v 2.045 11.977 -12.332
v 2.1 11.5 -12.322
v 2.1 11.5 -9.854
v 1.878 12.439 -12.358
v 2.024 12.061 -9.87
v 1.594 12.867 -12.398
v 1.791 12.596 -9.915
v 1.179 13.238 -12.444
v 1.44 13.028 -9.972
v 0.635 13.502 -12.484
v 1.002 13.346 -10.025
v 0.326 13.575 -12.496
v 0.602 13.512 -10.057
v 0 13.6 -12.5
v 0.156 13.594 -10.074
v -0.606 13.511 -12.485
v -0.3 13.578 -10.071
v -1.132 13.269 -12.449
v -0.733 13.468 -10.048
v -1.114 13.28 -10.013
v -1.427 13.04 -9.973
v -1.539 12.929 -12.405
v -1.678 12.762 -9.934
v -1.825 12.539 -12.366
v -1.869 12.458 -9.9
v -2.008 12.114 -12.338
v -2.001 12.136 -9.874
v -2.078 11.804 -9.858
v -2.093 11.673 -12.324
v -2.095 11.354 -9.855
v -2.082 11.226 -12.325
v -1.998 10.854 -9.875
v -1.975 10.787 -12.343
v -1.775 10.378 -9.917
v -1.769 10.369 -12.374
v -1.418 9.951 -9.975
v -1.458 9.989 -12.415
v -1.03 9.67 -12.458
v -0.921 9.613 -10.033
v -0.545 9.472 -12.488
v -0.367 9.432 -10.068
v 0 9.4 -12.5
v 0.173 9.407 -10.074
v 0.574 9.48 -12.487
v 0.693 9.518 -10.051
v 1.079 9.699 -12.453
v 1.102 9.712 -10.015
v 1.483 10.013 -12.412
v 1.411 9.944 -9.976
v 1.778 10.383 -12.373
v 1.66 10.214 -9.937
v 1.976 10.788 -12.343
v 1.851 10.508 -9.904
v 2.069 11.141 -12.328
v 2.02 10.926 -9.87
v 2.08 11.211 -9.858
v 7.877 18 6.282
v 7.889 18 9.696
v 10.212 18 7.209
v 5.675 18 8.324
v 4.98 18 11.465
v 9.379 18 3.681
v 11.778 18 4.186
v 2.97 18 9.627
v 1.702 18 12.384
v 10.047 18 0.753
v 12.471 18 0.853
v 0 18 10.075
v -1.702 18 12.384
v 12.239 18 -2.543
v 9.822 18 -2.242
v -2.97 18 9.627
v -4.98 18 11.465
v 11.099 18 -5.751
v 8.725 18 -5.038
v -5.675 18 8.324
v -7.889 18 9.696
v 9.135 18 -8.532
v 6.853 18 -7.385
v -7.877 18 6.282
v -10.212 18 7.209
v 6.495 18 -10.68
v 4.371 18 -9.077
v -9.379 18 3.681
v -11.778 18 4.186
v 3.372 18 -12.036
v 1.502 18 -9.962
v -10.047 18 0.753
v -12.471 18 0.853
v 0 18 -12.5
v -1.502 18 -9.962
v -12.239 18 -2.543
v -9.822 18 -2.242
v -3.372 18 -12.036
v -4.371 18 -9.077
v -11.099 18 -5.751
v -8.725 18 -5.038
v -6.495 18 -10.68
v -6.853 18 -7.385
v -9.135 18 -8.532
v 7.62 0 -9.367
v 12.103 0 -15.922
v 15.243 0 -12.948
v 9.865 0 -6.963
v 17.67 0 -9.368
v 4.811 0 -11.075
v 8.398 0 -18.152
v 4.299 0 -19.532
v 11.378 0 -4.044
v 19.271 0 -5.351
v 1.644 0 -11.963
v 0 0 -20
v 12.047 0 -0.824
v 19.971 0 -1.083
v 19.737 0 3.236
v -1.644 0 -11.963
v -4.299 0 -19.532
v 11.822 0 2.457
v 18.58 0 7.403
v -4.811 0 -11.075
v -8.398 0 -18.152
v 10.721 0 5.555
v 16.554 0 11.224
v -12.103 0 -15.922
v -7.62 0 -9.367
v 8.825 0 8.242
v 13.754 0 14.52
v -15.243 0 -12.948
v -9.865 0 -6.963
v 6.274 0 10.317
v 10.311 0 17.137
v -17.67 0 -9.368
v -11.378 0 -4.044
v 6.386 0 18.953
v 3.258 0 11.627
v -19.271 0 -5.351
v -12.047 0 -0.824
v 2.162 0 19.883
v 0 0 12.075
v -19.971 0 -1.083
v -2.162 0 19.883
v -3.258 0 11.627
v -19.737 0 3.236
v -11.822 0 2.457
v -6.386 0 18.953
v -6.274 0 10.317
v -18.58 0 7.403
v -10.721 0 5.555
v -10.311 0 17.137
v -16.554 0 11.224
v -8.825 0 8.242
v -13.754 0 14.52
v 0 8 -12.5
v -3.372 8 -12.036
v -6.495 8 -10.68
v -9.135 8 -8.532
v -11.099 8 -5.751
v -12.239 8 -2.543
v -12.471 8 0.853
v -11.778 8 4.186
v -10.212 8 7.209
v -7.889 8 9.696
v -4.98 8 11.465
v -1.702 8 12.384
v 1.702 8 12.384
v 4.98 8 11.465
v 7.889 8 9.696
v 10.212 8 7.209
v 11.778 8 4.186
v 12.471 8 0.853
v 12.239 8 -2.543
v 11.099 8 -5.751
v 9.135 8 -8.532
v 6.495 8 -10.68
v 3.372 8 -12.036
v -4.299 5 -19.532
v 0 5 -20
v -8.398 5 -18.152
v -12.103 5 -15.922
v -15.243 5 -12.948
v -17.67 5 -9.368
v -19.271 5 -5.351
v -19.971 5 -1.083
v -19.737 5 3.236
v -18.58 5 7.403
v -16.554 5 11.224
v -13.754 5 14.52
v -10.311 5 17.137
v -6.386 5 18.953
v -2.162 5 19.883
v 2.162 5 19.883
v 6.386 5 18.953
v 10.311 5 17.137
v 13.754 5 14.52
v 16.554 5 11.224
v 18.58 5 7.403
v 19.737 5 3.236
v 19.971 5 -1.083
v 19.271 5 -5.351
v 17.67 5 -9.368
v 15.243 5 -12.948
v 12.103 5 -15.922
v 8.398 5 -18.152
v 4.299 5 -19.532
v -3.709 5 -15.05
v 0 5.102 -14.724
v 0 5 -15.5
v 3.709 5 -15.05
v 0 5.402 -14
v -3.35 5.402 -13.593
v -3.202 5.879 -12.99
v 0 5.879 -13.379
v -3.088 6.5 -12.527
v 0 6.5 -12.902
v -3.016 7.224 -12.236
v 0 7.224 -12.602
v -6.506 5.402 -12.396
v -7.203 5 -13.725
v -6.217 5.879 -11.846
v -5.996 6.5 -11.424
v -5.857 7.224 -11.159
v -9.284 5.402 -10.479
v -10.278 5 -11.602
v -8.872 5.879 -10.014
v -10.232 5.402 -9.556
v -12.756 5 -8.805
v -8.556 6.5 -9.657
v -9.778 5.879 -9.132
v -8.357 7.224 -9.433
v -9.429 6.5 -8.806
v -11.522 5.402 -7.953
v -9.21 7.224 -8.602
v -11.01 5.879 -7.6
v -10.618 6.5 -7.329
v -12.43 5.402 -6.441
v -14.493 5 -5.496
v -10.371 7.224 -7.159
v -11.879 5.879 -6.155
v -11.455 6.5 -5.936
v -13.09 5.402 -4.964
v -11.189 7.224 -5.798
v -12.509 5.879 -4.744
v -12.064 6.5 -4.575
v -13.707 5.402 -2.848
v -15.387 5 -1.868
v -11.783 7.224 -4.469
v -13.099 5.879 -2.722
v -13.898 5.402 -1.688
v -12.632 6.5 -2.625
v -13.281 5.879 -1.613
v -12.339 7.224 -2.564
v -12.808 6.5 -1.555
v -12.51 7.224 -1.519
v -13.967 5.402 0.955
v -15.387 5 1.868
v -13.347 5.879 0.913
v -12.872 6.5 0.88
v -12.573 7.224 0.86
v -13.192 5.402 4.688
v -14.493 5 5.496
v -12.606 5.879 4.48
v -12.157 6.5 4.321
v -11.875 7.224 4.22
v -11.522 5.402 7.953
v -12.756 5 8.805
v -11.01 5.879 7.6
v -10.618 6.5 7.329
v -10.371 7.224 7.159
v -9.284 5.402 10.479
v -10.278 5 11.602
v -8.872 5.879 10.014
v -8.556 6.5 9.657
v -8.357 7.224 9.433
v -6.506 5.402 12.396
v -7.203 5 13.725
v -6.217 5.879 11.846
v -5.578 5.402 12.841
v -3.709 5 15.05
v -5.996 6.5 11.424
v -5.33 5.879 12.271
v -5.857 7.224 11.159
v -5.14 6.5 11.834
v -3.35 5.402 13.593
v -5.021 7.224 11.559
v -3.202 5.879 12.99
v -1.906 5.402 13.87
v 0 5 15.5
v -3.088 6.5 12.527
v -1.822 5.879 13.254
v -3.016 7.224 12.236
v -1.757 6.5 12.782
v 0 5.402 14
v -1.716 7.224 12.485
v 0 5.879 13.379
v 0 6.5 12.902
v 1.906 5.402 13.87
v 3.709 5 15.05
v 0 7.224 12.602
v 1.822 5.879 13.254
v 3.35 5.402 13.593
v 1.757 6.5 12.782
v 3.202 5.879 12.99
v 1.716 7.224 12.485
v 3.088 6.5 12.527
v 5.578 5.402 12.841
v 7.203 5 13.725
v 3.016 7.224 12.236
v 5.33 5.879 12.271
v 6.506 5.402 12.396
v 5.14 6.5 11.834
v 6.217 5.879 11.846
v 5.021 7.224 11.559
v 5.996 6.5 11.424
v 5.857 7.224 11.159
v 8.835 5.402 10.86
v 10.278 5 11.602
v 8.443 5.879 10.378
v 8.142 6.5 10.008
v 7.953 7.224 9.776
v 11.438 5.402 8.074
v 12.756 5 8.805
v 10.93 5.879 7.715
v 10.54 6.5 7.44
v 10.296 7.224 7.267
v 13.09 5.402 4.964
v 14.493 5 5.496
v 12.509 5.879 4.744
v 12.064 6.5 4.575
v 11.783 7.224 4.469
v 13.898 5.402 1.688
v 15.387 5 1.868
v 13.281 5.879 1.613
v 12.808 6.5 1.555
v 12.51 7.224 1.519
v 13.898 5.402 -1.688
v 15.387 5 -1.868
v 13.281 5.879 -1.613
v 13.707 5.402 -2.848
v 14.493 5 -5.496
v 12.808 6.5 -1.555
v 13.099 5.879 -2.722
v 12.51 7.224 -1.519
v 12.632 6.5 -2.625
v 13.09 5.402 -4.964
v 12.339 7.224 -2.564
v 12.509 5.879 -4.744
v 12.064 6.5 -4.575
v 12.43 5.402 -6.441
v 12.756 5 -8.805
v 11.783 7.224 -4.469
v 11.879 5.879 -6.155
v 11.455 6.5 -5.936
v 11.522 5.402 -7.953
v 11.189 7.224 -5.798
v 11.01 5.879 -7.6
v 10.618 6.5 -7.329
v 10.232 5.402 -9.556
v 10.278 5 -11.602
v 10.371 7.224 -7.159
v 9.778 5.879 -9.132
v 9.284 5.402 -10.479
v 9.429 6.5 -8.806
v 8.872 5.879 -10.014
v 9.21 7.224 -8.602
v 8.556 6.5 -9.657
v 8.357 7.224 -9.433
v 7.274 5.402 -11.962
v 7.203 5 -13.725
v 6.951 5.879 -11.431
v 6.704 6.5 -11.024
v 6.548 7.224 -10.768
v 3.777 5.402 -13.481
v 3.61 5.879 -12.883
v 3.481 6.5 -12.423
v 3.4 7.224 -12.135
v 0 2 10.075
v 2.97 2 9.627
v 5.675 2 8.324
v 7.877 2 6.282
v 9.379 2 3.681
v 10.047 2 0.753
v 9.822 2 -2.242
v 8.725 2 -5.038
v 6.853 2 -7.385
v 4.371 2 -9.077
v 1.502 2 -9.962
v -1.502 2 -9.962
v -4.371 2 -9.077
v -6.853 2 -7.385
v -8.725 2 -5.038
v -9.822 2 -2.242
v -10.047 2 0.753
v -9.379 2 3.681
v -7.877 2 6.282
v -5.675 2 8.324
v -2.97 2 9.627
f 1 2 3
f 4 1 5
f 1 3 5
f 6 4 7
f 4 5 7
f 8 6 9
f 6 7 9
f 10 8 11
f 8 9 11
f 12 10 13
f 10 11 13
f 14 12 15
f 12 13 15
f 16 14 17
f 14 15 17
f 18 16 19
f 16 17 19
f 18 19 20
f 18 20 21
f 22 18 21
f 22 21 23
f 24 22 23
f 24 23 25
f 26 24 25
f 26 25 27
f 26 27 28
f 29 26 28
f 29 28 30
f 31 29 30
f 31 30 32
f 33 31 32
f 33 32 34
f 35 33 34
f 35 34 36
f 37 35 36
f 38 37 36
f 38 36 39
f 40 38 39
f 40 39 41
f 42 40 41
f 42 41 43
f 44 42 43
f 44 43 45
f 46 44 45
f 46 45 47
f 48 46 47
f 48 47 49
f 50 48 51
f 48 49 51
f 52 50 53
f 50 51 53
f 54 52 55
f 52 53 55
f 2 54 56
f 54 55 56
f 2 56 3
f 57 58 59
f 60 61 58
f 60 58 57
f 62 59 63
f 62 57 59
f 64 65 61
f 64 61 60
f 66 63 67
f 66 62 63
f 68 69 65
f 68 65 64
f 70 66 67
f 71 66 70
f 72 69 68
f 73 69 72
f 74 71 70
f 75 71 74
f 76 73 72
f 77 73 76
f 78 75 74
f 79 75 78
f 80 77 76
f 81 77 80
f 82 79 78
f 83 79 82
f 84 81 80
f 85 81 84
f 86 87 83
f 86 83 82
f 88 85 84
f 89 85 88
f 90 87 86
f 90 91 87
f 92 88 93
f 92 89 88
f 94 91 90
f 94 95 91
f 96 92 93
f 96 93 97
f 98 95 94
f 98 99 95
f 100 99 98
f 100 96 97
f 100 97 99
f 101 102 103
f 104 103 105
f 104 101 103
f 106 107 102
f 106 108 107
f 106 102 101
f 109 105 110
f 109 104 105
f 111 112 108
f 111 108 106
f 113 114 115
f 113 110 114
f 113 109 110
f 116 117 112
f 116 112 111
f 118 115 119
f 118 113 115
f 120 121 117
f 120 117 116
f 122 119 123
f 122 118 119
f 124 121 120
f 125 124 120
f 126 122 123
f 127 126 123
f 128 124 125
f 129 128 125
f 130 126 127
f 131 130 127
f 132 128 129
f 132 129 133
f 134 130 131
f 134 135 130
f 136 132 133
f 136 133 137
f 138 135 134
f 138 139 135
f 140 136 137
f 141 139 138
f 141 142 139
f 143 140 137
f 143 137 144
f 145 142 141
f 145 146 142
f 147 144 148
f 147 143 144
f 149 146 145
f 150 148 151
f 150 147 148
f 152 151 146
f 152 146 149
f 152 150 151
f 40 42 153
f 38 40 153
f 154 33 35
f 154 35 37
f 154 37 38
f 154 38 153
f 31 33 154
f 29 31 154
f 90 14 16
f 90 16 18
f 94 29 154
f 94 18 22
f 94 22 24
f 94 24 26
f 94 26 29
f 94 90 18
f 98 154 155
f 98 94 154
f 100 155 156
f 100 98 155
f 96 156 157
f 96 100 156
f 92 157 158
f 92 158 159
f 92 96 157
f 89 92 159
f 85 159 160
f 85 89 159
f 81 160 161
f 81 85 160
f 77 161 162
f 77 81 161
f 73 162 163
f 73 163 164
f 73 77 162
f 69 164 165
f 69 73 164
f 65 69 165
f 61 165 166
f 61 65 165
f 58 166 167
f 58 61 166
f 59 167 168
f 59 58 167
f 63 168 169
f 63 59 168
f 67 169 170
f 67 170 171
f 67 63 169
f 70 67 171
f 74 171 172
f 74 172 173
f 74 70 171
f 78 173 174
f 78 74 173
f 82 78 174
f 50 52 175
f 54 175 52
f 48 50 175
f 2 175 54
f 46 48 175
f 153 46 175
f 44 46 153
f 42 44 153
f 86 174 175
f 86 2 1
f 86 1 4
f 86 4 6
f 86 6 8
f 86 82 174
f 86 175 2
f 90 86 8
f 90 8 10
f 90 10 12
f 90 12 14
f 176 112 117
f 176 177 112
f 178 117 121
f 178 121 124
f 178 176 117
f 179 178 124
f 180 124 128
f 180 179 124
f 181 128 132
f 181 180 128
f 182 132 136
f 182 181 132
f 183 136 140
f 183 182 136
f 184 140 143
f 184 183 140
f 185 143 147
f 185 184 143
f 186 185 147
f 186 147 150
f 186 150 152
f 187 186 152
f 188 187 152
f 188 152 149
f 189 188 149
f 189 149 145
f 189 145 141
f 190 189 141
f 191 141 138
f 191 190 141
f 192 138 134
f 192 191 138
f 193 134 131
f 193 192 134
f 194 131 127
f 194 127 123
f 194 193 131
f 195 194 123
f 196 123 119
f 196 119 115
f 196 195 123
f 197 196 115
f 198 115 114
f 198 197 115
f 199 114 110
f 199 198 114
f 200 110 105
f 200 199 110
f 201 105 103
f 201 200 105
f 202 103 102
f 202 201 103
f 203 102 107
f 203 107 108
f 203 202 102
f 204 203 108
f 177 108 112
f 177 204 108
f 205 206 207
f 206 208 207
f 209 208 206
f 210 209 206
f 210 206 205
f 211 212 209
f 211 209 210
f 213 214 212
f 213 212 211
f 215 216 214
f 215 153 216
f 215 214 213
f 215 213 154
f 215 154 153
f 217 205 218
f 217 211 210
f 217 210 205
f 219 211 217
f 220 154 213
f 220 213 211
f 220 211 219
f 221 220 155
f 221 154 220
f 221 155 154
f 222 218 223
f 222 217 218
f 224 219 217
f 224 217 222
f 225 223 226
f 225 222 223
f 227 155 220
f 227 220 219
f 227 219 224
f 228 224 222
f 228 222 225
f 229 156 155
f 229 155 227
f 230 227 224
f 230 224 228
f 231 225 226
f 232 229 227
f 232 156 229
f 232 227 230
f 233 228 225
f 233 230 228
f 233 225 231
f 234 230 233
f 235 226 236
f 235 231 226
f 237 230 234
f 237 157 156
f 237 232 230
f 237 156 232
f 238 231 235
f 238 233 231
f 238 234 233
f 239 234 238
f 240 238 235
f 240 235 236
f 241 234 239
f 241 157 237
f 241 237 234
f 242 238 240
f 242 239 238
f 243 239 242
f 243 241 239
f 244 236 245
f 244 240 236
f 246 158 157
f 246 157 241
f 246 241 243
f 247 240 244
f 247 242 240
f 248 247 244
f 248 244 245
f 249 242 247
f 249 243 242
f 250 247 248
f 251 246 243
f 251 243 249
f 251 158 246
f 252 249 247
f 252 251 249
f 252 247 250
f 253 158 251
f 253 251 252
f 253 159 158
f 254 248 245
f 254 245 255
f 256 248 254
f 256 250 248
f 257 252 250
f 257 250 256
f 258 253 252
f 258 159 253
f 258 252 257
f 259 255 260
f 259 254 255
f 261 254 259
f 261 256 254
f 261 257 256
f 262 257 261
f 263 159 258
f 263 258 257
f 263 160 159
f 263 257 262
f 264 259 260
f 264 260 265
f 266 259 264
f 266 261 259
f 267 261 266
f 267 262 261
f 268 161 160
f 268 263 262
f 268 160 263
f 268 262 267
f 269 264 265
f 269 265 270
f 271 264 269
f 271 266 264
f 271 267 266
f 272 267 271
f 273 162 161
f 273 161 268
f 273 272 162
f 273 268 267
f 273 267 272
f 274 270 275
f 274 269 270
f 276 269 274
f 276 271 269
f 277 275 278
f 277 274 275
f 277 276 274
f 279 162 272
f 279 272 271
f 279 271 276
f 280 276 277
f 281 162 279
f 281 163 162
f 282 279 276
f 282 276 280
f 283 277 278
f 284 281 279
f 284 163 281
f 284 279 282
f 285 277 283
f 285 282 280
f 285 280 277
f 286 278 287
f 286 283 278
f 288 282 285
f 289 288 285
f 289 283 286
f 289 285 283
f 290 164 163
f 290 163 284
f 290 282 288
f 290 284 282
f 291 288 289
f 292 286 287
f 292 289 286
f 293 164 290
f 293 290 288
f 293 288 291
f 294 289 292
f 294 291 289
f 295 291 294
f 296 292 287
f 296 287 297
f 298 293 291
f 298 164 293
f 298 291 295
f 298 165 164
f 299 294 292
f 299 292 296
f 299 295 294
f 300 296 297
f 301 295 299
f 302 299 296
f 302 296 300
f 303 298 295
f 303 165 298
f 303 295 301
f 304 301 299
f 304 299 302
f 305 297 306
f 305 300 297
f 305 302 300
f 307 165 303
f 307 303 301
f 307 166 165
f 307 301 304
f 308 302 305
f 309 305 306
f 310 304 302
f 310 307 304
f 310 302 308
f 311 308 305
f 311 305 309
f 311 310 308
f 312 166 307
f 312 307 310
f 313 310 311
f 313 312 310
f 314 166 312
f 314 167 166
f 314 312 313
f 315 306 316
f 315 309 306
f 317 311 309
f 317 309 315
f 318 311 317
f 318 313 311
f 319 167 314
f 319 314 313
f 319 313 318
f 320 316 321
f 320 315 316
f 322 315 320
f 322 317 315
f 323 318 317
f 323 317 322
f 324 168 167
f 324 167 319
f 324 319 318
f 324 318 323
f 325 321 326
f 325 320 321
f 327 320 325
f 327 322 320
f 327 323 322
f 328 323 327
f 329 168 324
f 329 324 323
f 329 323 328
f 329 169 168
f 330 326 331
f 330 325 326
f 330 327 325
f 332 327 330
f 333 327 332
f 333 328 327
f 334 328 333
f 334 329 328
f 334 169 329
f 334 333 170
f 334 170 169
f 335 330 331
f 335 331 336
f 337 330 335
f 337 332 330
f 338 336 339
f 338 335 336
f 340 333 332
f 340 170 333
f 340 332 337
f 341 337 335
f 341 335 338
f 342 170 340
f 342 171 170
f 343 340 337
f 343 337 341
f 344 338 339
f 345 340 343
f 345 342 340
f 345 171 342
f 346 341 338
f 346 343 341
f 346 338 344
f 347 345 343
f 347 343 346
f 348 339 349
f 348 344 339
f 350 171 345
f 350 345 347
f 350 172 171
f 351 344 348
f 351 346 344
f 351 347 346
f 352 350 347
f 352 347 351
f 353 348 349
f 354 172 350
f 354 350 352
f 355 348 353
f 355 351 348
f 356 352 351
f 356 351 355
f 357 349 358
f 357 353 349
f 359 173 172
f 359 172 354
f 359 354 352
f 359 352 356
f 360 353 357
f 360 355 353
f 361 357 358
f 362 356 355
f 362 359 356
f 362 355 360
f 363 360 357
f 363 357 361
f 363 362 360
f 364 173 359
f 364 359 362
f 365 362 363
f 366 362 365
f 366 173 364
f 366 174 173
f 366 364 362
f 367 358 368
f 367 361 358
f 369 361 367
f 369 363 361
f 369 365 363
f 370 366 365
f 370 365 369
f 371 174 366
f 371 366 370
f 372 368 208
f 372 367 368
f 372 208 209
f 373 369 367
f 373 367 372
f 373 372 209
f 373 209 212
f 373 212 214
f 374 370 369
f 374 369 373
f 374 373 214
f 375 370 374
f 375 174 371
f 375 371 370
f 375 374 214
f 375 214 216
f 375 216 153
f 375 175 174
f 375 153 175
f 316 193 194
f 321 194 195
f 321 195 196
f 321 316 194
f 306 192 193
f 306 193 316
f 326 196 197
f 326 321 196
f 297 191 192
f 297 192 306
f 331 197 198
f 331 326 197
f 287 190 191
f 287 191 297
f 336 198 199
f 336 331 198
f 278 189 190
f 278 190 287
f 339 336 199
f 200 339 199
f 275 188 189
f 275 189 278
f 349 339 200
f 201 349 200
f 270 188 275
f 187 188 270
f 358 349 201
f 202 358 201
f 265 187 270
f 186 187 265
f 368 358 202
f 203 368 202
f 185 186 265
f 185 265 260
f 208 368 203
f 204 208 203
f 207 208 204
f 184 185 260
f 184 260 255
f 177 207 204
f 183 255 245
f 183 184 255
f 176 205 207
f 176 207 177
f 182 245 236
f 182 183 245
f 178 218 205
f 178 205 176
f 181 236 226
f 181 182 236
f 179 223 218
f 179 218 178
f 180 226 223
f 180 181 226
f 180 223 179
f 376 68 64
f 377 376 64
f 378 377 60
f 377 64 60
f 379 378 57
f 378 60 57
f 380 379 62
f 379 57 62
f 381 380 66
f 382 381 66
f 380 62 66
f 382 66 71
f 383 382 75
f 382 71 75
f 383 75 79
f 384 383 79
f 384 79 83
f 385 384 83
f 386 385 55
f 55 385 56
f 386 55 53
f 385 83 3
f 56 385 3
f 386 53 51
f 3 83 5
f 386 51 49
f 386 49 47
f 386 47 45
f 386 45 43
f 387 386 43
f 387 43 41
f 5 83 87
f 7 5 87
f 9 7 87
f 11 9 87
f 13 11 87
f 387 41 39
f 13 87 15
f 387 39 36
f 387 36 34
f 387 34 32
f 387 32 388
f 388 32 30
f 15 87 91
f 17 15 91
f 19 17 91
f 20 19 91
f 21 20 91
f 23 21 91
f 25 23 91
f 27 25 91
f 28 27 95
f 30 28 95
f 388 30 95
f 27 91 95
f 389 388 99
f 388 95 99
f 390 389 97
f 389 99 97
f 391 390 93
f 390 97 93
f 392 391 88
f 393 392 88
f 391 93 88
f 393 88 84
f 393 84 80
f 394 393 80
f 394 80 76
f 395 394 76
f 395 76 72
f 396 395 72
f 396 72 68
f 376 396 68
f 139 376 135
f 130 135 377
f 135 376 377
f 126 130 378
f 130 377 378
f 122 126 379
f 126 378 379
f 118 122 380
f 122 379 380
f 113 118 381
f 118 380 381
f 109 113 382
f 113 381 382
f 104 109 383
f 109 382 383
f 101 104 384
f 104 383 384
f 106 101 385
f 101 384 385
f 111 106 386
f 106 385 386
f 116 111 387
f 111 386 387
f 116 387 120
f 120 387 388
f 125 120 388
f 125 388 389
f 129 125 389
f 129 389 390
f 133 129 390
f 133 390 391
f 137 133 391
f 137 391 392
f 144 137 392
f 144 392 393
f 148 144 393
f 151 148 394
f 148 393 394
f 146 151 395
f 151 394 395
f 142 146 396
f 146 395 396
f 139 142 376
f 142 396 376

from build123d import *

# Parameters (mm, degrees)
SKIZZE3_R                       = 10.075
SCHNITT_LINEAR_AUSTRAGEN1_DEPTH = 34.526109228
SKIZZE4_R                       = 2.1
SCHNITT_LINEAR_AUSTRAGEN2_DEPTH = 34.526109228
VERRUNDUNG1_R                   = 3
FASE1_SIZE                      = 2


with BuildPart() as part:
    # Skizze2 → Rotation1 (revolve)
    with BuildSketch(Plane.XY, mode=Mode.PRIVATE) as rotation1_sk:
        Polygon((0, 0), (20, 0), (20, 5), (12.5, 5), (12.5, 18), (0, 18), align=None)
    revolve(rotation1_sk.sketch.rotate(Axis((0, 0, 0), (0, 1, 0)), 90), axis=Axis((0, 0, 0), (0, 1, 0)))

    # Skizze3 → Schnitt-Linear austragen1 (cut, through all)
    with BuildSketch(Plane(origin=(0, 18, 0), x_dir=(1, 0, 0), z_dir=(0, 1, 0))):
        with Locations(Location((0, 0, 0), (0, 0, 270))):
            Circle(SKIZZE3_R)
    extrude(amount=-SCHNITT_LINEAR_AUSTRAGEN1_DEPTH, mode=Mode.SUBTRACT)

    # Skizze4 → Schnitt-Linear austragen2 (cut, through all)
    with BuildSketch(Plane.XY):
        with Locations((0, 11.5)):
            Circle(SKIZZE4_R)
    extrude(amount=-SCHNITT_LINEAR_AUSTRAGEN2_DEPTH, mode=Mode.SUBTRACT)

    # Verrundung1
    verrundung1_edges = [part.edges().sort_by_distance(p)[0] for p in [
        (0, 5, 12.5),
    ]]
    fillet(verrundung1_edges, radius=VERRUNDUNG1_R)

    # Fase1
    fase1_edges = [part.edges().sort_by_distance(p)[0] for p in [
        (0, 0, -10.075),
    ]]
    chamfer(fase1_edges, length=FASE1_SIZE)


solid = part.part
